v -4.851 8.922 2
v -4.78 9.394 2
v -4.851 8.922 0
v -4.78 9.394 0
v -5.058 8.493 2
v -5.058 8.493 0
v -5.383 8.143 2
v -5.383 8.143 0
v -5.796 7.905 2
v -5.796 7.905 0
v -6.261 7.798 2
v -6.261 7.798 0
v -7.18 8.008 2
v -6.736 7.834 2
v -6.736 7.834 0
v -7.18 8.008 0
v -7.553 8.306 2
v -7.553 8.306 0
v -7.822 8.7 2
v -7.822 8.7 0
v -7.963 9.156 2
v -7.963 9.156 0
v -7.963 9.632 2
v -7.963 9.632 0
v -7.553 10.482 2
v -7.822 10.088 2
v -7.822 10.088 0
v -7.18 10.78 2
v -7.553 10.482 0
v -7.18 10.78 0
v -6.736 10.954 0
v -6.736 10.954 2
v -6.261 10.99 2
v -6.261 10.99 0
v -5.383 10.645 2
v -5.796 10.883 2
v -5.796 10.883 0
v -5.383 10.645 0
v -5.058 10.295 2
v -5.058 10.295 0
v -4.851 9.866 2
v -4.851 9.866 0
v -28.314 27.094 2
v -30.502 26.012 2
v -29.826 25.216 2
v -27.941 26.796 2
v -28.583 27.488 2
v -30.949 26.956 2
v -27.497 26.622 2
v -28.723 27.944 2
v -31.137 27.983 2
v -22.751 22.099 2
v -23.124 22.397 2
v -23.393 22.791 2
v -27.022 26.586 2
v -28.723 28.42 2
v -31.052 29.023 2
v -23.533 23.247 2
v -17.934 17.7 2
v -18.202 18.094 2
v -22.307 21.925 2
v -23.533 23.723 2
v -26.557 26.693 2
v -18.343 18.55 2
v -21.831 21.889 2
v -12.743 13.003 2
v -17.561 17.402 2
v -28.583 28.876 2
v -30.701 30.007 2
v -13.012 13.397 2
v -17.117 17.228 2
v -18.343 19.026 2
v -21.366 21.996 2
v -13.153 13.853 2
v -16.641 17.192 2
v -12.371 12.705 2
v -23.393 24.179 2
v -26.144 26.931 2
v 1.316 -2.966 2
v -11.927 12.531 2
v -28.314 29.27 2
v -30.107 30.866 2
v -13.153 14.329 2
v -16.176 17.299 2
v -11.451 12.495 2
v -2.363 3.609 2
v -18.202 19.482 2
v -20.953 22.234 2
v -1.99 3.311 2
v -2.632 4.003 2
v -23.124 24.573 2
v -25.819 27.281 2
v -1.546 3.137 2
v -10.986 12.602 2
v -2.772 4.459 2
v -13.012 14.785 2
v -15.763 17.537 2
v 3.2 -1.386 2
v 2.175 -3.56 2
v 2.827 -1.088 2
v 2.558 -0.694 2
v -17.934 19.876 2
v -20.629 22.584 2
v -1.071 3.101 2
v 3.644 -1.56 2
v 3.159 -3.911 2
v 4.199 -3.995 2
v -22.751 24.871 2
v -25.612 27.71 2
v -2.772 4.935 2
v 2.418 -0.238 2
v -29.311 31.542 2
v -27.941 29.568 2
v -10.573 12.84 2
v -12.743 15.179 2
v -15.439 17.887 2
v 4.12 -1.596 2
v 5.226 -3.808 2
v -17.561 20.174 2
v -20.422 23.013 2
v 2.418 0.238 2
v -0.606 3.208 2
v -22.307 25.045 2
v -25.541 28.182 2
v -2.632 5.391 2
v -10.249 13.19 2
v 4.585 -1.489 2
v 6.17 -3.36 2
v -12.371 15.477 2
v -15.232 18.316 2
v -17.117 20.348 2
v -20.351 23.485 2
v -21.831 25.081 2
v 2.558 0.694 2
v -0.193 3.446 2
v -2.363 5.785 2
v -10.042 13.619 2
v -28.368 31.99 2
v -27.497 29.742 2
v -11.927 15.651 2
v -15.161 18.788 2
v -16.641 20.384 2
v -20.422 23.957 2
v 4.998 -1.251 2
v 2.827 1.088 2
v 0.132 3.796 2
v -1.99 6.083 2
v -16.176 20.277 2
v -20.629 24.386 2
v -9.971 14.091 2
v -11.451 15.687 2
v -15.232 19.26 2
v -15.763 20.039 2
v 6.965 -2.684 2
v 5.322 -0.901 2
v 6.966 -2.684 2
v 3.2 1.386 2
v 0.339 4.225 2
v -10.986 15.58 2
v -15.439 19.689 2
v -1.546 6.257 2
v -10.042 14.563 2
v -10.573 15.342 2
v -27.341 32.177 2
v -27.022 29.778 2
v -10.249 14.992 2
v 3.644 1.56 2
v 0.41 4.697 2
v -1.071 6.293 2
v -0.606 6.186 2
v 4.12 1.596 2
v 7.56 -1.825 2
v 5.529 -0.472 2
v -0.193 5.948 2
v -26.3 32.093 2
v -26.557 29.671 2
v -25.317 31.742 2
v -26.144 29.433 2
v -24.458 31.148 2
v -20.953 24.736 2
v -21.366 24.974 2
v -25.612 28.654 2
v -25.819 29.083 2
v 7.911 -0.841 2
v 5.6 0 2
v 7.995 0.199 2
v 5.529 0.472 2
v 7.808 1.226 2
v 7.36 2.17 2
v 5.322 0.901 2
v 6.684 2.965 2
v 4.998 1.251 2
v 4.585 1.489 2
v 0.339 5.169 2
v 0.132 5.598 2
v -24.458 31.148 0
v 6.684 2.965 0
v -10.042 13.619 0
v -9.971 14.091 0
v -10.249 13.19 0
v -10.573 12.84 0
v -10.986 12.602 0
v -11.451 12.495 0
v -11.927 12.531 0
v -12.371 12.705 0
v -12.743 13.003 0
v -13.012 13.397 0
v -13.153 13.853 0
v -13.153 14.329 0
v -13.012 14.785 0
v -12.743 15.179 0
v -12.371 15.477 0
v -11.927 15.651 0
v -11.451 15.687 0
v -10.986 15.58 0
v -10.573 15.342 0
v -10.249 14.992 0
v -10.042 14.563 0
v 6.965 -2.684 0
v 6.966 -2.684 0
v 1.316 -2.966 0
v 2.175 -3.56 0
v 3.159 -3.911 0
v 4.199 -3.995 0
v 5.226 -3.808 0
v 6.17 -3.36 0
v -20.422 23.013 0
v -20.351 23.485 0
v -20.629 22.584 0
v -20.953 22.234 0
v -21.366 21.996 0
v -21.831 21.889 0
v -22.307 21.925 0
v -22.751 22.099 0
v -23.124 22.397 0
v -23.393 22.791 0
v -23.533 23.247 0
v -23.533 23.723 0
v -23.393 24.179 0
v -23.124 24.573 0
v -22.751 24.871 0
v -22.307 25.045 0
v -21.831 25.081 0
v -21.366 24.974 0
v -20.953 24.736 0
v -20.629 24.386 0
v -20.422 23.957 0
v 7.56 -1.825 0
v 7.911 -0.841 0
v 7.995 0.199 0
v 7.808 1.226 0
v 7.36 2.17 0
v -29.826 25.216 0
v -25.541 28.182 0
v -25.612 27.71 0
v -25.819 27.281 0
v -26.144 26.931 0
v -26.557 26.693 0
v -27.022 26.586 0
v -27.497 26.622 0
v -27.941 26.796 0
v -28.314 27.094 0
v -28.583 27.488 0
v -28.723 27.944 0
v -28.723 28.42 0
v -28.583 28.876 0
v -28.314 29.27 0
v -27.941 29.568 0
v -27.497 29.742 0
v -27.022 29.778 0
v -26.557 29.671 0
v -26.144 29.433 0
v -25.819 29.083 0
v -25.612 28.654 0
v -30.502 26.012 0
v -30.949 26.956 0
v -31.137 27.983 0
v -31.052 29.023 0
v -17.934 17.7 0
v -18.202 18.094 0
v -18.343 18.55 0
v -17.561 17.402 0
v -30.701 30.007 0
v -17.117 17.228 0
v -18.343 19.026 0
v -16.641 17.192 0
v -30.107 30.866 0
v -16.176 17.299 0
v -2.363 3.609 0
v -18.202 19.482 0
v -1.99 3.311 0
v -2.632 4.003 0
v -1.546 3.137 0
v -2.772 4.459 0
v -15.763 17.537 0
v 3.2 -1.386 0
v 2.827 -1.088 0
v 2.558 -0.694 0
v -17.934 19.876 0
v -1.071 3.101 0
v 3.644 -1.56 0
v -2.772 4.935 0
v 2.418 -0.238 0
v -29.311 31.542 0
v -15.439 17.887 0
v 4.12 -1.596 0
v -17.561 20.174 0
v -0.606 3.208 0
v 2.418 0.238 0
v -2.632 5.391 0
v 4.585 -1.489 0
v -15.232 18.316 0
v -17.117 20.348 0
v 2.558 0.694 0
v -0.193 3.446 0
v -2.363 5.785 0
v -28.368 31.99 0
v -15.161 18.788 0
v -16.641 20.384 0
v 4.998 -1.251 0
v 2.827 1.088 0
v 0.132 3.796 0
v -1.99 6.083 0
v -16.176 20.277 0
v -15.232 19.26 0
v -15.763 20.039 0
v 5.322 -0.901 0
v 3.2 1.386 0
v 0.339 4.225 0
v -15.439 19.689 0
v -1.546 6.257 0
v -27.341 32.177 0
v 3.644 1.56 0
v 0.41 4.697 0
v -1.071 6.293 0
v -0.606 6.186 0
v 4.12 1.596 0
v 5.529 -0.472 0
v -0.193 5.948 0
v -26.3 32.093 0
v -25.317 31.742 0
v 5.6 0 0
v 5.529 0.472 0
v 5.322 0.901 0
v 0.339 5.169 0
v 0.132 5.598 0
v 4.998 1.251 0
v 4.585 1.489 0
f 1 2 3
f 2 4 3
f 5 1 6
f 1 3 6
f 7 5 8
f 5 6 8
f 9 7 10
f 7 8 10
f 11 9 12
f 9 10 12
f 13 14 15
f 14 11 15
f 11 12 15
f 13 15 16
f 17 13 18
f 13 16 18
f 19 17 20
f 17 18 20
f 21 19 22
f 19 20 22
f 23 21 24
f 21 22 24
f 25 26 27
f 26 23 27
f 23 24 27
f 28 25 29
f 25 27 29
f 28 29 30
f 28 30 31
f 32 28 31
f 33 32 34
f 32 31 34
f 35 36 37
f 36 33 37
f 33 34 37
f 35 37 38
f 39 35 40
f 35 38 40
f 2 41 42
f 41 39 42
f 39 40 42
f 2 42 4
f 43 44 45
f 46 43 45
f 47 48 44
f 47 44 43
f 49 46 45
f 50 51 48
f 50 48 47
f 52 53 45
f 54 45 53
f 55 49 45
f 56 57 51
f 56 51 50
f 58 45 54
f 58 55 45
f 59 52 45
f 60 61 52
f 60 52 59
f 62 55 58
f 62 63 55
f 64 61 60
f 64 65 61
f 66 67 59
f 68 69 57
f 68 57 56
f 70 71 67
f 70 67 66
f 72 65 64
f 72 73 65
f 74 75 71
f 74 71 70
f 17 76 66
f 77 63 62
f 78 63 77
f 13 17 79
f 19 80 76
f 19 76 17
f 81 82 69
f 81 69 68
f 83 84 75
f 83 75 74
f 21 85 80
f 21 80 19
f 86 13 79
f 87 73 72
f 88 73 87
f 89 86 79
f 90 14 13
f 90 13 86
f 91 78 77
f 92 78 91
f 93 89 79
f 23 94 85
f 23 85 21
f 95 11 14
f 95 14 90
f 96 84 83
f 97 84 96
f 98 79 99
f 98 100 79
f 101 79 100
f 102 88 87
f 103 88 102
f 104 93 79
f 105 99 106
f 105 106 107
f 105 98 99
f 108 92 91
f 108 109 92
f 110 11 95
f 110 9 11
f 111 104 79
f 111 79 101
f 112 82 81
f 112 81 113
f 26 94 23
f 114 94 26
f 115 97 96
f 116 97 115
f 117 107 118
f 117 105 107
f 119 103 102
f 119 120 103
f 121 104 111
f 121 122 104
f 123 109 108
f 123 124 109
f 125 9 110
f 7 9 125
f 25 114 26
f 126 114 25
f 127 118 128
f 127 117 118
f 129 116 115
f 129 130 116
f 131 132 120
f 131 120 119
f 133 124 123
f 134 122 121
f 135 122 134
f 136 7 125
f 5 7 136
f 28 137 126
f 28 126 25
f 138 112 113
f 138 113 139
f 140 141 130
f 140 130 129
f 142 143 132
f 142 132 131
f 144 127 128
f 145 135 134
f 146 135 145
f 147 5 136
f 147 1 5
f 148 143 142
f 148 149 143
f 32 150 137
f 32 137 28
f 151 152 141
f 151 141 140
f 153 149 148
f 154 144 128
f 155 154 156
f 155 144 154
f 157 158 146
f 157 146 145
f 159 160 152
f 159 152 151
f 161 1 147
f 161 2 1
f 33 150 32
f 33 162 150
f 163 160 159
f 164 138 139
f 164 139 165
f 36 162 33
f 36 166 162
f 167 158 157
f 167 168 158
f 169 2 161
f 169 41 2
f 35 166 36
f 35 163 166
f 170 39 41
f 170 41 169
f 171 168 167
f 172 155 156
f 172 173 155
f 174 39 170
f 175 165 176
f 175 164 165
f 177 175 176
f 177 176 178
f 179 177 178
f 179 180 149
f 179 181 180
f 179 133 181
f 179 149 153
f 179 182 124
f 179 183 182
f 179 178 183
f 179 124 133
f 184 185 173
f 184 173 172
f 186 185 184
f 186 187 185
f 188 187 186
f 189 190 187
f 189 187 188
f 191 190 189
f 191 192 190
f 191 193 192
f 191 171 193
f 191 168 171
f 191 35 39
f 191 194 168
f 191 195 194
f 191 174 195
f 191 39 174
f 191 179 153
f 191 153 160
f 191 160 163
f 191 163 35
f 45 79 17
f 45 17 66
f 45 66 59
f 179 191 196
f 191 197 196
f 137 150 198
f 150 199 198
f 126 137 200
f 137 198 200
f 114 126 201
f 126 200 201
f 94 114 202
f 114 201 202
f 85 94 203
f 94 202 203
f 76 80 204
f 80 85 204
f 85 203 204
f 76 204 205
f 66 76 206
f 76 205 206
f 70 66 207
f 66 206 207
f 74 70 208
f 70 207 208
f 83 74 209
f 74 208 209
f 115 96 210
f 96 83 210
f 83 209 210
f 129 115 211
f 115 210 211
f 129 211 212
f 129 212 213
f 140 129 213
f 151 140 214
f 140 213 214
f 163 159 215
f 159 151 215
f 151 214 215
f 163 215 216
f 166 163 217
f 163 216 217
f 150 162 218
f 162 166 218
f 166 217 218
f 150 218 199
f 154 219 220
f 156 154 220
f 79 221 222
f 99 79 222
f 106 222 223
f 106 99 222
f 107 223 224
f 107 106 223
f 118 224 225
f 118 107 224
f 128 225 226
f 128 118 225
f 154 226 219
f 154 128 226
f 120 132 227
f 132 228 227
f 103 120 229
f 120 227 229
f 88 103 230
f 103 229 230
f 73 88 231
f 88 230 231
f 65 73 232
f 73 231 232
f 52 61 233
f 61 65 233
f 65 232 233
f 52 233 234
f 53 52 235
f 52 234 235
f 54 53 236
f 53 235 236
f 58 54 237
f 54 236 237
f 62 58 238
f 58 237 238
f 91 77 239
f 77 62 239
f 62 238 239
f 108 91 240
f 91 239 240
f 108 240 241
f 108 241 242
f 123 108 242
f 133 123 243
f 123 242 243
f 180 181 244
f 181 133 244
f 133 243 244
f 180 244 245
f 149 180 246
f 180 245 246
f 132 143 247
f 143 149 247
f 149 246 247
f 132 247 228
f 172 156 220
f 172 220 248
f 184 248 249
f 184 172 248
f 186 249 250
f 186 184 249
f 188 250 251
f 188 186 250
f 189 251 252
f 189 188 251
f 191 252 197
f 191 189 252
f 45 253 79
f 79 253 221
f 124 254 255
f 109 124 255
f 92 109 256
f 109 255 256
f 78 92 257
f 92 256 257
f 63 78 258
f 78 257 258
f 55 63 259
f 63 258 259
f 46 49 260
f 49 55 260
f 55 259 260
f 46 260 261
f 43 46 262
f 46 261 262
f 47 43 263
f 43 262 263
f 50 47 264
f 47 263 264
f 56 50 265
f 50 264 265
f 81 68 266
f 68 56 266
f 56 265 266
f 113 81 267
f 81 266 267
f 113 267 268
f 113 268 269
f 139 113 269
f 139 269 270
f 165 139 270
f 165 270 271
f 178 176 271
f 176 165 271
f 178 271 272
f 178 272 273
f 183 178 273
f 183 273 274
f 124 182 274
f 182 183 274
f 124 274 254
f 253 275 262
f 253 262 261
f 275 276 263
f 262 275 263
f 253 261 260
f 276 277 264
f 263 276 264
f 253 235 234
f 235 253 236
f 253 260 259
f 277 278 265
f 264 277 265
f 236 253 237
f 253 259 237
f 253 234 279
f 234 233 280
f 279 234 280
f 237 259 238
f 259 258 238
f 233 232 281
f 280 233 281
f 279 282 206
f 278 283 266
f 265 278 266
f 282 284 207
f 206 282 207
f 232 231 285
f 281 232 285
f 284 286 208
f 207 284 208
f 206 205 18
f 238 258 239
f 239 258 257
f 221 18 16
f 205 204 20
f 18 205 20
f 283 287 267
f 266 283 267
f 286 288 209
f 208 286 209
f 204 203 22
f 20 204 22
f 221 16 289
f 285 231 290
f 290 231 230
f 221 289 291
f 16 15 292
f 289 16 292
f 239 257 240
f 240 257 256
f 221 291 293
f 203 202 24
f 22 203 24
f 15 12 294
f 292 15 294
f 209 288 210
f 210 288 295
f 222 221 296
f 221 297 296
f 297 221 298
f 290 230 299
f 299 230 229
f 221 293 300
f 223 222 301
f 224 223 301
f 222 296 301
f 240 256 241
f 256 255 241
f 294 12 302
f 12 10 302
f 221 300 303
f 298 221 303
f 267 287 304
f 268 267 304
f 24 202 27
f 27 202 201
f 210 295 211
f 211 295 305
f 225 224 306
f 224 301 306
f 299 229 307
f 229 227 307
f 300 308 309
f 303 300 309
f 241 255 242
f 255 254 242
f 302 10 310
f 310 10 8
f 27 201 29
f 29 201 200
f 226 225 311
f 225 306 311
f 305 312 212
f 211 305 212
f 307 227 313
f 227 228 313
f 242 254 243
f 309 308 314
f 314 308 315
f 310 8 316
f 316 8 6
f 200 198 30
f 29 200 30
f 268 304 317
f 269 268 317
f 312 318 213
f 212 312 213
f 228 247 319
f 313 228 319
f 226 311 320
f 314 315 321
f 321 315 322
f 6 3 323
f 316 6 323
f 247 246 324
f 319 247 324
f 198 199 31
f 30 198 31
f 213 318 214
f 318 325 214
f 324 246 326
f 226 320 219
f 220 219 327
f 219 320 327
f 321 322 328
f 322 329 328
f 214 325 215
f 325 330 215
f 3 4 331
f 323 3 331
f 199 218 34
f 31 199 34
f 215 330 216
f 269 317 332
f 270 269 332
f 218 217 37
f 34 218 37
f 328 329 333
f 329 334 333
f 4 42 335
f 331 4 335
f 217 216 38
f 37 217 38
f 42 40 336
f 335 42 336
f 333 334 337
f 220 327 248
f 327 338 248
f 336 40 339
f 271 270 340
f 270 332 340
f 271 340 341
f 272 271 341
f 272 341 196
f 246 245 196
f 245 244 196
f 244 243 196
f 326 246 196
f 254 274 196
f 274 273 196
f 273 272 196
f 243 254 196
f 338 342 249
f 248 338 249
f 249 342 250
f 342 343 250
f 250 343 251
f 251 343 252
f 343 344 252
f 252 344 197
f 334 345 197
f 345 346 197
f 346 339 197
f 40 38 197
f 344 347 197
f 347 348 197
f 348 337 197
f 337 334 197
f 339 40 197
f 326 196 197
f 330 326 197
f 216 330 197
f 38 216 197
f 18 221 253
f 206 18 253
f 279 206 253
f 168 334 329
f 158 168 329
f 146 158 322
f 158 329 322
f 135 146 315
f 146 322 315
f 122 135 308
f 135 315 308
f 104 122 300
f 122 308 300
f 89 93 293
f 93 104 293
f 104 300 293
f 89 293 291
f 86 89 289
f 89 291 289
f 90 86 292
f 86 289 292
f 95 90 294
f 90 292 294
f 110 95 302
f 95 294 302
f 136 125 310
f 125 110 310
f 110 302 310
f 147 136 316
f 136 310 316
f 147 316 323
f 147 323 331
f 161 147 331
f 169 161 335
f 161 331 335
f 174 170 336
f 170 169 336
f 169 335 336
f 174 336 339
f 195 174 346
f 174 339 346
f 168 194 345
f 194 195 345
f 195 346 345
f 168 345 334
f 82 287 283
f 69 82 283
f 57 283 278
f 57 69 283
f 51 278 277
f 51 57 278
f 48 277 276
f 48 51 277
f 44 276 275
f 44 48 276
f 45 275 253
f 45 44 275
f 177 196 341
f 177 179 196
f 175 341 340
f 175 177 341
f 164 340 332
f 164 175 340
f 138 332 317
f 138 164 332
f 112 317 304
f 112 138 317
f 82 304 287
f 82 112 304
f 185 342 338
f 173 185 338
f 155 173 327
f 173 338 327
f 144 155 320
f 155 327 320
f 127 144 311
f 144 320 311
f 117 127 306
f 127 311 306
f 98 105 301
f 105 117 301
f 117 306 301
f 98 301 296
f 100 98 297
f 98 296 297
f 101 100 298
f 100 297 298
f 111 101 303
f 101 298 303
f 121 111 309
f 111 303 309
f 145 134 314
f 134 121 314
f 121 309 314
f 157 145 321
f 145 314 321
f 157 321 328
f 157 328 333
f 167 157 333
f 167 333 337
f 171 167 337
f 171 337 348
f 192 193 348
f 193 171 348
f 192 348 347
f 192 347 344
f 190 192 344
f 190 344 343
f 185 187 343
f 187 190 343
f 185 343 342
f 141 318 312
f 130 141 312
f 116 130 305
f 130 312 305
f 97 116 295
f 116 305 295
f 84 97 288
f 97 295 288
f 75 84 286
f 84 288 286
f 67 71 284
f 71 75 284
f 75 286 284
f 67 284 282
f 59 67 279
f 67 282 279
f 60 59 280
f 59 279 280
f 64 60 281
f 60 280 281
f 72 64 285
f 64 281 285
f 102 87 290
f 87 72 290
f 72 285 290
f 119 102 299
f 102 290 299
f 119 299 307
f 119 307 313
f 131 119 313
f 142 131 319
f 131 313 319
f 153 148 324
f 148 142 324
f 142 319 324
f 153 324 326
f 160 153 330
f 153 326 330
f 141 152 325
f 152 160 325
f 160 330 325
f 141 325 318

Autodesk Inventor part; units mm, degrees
ref_plane "YZ Plane" through (0, 0, 0) normal (1, 0, 0) x (0, 1, 0)
ref_plane "XZ Plane" through (0, 0, 0) normal (0, 1, 0) x (-1, 0, 0)
ref_plane "XY Plane" through (0, 0, 0) normal (0, 0, 1) x (1, 0, 0)
sketch "Sketch1" plane through (0, 0, 0) normal (0, 0, 1) x (1, 0, 0)
  line L0 (4.2818, -5.6498) -> (9.6498, 0.2818)
  line L1 (9.6498, 0.2818) -> (-27.4231, 33.8318)
  line L2 (-27.4231, 33.8318) -> (-32.7911, 27.9001)
  line L3 (-32.7911, 27.9001) -> (4.2818, -5.6498)
  circle A0 centre (4, 0) radius 1.6 projected
  circle A1 centre (4, 0) radius 1.6
  circle A2 centre (-1.1902, 4.697) radius 1.6
  circle A3 centre (-6.3804, 9.394) radius 1.6
  circle A4 centre (-11.5706, 14.091) radius 1.6
  circle A5 centre (-16.7608, 18.788) radius 1.6
  circle A6 centre (-21.951, 23.485) radius 1.6
  circle A7 centre (-27.1413, 28.182) radius 1.6
  point P0 (0, 0)
  dimension "d0" = 8
  dimension "d1" = 4
  dimension "d2" = 4
  dimension "d5" = 7
  dimension "d10" = 4
extrude "Extrusion1" add sketch "Sketch1" along normal blind 2
fillet "Fillet1" radius 4 4 edges at (-32.7911, 27.9001, 1) (-27.4231, 33.8318, 1) (4.2818, -5.6498, 1) (9.6498, 0.2818, 1)
equation "\"d1\" = 0.5 * d0"
properties part number "control-arm"
